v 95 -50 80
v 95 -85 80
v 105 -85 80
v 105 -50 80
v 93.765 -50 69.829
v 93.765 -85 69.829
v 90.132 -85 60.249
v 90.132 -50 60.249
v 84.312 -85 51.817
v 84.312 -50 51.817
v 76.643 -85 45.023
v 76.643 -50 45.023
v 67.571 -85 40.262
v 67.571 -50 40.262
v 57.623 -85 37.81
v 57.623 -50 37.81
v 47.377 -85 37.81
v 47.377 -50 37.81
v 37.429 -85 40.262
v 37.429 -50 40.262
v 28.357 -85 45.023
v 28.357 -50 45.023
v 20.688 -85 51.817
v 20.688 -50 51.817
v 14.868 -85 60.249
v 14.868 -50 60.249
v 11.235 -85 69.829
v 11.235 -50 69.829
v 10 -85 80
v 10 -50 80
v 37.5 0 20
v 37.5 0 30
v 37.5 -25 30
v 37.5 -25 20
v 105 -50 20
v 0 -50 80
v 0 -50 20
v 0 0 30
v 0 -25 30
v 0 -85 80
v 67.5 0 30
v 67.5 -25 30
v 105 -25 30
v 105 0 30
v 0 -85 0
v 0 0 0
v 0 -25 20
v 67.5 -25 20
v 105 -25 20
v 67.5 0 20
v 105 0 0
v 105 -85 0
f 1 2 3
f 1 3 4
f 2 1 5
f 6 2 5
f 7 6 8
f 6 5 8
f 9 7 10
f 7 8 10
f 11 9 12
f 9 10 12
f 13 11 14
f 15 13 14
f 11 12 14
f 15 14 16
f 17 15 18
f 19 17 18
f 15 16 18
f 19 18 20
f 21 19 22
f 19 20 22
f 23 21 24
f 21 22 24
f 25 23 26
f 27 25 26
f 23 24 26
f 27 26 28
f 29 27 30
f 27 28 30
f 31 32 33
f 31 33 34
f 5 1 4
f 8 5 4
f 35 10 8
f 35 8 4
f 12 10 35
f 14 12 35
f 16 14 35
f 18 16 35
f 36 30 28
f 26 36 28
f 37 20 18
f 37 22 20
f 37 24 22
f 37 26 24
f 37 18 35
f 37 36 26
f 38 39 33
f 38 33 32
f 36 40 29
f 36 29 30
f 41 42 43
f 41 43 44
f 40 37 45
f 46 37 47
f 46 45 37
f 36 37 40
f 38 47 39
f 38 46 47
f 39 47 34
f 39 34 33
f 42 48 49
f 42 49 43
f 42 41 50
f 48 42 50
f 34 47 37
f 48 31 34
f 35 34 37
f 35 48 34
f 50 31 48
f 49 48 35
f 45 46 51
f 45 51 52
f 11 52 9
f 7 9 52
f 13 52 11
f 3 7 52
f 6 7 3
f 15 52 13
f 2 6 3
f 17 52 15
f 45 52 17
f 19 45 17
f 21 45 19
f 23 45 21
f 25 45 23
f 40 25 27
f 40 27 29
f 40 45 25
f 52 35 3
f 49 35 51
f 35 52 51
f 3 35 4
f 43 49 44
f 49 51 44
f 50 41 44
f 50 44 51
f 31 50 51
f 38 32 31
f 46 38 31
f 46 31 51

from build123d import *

# Parameters (mm, degrees)
EXTRUDE_1_DEPTH     = 105
SKETCH_23_W         = 30
SKETCH_23_H         = 10
CUT_EXTRUDE_1_DEPTH = 25
SKETCH_24_R         = 42.5
CUT_EXTRUDE_3_DEPTH = 35


with BuildPart() as part:
    # Эскиз2 → Бобышка-Вытянуть1 (new body)
    with BuildSketch(Plane(origin=(0, 0, 0), x_dir=(0, 0, -1), z_dir=(1, 0, 0))):
        Polygon((0, 0), (0, -85), (-80, -85), (-80, -50), (-20, -50), (-20, -25), (-30, -25), (-30, 0), align=None)
    extrude(amount=EXTRUDE_1_DEPTH)

    # Эскиз23 → Вырез-Вытянуть1 (cut)
    with BuildSketch(Plane(origin=(0, 0, 0), x_dir=(1, 0, 0), z_dir=(0, 1, 0))):
        with Locations((52.5, -25)):
            Rectangle(SKETCH_23_W, SKETCH_23_H)
    extrude(amount=-CUT_EXTRUDE_1_DEPTH, mode=Mode.SUBTRACT)

    # Эскиз24 → Вырез-Вытянуть3 (cut)
    with BuildSketch(Plane(origin=(0, -50, 0), x_dir=(1, 0, 0), z_dir=(0, 1, 0))):
        with Locations((52.5, -80)):
            Circle(SKETCH_24_R)
    extrude(amount=-CUT_EXTRUDE_3_DEPTH, mode=Mode.SUBTRACT)


solid = part.part
